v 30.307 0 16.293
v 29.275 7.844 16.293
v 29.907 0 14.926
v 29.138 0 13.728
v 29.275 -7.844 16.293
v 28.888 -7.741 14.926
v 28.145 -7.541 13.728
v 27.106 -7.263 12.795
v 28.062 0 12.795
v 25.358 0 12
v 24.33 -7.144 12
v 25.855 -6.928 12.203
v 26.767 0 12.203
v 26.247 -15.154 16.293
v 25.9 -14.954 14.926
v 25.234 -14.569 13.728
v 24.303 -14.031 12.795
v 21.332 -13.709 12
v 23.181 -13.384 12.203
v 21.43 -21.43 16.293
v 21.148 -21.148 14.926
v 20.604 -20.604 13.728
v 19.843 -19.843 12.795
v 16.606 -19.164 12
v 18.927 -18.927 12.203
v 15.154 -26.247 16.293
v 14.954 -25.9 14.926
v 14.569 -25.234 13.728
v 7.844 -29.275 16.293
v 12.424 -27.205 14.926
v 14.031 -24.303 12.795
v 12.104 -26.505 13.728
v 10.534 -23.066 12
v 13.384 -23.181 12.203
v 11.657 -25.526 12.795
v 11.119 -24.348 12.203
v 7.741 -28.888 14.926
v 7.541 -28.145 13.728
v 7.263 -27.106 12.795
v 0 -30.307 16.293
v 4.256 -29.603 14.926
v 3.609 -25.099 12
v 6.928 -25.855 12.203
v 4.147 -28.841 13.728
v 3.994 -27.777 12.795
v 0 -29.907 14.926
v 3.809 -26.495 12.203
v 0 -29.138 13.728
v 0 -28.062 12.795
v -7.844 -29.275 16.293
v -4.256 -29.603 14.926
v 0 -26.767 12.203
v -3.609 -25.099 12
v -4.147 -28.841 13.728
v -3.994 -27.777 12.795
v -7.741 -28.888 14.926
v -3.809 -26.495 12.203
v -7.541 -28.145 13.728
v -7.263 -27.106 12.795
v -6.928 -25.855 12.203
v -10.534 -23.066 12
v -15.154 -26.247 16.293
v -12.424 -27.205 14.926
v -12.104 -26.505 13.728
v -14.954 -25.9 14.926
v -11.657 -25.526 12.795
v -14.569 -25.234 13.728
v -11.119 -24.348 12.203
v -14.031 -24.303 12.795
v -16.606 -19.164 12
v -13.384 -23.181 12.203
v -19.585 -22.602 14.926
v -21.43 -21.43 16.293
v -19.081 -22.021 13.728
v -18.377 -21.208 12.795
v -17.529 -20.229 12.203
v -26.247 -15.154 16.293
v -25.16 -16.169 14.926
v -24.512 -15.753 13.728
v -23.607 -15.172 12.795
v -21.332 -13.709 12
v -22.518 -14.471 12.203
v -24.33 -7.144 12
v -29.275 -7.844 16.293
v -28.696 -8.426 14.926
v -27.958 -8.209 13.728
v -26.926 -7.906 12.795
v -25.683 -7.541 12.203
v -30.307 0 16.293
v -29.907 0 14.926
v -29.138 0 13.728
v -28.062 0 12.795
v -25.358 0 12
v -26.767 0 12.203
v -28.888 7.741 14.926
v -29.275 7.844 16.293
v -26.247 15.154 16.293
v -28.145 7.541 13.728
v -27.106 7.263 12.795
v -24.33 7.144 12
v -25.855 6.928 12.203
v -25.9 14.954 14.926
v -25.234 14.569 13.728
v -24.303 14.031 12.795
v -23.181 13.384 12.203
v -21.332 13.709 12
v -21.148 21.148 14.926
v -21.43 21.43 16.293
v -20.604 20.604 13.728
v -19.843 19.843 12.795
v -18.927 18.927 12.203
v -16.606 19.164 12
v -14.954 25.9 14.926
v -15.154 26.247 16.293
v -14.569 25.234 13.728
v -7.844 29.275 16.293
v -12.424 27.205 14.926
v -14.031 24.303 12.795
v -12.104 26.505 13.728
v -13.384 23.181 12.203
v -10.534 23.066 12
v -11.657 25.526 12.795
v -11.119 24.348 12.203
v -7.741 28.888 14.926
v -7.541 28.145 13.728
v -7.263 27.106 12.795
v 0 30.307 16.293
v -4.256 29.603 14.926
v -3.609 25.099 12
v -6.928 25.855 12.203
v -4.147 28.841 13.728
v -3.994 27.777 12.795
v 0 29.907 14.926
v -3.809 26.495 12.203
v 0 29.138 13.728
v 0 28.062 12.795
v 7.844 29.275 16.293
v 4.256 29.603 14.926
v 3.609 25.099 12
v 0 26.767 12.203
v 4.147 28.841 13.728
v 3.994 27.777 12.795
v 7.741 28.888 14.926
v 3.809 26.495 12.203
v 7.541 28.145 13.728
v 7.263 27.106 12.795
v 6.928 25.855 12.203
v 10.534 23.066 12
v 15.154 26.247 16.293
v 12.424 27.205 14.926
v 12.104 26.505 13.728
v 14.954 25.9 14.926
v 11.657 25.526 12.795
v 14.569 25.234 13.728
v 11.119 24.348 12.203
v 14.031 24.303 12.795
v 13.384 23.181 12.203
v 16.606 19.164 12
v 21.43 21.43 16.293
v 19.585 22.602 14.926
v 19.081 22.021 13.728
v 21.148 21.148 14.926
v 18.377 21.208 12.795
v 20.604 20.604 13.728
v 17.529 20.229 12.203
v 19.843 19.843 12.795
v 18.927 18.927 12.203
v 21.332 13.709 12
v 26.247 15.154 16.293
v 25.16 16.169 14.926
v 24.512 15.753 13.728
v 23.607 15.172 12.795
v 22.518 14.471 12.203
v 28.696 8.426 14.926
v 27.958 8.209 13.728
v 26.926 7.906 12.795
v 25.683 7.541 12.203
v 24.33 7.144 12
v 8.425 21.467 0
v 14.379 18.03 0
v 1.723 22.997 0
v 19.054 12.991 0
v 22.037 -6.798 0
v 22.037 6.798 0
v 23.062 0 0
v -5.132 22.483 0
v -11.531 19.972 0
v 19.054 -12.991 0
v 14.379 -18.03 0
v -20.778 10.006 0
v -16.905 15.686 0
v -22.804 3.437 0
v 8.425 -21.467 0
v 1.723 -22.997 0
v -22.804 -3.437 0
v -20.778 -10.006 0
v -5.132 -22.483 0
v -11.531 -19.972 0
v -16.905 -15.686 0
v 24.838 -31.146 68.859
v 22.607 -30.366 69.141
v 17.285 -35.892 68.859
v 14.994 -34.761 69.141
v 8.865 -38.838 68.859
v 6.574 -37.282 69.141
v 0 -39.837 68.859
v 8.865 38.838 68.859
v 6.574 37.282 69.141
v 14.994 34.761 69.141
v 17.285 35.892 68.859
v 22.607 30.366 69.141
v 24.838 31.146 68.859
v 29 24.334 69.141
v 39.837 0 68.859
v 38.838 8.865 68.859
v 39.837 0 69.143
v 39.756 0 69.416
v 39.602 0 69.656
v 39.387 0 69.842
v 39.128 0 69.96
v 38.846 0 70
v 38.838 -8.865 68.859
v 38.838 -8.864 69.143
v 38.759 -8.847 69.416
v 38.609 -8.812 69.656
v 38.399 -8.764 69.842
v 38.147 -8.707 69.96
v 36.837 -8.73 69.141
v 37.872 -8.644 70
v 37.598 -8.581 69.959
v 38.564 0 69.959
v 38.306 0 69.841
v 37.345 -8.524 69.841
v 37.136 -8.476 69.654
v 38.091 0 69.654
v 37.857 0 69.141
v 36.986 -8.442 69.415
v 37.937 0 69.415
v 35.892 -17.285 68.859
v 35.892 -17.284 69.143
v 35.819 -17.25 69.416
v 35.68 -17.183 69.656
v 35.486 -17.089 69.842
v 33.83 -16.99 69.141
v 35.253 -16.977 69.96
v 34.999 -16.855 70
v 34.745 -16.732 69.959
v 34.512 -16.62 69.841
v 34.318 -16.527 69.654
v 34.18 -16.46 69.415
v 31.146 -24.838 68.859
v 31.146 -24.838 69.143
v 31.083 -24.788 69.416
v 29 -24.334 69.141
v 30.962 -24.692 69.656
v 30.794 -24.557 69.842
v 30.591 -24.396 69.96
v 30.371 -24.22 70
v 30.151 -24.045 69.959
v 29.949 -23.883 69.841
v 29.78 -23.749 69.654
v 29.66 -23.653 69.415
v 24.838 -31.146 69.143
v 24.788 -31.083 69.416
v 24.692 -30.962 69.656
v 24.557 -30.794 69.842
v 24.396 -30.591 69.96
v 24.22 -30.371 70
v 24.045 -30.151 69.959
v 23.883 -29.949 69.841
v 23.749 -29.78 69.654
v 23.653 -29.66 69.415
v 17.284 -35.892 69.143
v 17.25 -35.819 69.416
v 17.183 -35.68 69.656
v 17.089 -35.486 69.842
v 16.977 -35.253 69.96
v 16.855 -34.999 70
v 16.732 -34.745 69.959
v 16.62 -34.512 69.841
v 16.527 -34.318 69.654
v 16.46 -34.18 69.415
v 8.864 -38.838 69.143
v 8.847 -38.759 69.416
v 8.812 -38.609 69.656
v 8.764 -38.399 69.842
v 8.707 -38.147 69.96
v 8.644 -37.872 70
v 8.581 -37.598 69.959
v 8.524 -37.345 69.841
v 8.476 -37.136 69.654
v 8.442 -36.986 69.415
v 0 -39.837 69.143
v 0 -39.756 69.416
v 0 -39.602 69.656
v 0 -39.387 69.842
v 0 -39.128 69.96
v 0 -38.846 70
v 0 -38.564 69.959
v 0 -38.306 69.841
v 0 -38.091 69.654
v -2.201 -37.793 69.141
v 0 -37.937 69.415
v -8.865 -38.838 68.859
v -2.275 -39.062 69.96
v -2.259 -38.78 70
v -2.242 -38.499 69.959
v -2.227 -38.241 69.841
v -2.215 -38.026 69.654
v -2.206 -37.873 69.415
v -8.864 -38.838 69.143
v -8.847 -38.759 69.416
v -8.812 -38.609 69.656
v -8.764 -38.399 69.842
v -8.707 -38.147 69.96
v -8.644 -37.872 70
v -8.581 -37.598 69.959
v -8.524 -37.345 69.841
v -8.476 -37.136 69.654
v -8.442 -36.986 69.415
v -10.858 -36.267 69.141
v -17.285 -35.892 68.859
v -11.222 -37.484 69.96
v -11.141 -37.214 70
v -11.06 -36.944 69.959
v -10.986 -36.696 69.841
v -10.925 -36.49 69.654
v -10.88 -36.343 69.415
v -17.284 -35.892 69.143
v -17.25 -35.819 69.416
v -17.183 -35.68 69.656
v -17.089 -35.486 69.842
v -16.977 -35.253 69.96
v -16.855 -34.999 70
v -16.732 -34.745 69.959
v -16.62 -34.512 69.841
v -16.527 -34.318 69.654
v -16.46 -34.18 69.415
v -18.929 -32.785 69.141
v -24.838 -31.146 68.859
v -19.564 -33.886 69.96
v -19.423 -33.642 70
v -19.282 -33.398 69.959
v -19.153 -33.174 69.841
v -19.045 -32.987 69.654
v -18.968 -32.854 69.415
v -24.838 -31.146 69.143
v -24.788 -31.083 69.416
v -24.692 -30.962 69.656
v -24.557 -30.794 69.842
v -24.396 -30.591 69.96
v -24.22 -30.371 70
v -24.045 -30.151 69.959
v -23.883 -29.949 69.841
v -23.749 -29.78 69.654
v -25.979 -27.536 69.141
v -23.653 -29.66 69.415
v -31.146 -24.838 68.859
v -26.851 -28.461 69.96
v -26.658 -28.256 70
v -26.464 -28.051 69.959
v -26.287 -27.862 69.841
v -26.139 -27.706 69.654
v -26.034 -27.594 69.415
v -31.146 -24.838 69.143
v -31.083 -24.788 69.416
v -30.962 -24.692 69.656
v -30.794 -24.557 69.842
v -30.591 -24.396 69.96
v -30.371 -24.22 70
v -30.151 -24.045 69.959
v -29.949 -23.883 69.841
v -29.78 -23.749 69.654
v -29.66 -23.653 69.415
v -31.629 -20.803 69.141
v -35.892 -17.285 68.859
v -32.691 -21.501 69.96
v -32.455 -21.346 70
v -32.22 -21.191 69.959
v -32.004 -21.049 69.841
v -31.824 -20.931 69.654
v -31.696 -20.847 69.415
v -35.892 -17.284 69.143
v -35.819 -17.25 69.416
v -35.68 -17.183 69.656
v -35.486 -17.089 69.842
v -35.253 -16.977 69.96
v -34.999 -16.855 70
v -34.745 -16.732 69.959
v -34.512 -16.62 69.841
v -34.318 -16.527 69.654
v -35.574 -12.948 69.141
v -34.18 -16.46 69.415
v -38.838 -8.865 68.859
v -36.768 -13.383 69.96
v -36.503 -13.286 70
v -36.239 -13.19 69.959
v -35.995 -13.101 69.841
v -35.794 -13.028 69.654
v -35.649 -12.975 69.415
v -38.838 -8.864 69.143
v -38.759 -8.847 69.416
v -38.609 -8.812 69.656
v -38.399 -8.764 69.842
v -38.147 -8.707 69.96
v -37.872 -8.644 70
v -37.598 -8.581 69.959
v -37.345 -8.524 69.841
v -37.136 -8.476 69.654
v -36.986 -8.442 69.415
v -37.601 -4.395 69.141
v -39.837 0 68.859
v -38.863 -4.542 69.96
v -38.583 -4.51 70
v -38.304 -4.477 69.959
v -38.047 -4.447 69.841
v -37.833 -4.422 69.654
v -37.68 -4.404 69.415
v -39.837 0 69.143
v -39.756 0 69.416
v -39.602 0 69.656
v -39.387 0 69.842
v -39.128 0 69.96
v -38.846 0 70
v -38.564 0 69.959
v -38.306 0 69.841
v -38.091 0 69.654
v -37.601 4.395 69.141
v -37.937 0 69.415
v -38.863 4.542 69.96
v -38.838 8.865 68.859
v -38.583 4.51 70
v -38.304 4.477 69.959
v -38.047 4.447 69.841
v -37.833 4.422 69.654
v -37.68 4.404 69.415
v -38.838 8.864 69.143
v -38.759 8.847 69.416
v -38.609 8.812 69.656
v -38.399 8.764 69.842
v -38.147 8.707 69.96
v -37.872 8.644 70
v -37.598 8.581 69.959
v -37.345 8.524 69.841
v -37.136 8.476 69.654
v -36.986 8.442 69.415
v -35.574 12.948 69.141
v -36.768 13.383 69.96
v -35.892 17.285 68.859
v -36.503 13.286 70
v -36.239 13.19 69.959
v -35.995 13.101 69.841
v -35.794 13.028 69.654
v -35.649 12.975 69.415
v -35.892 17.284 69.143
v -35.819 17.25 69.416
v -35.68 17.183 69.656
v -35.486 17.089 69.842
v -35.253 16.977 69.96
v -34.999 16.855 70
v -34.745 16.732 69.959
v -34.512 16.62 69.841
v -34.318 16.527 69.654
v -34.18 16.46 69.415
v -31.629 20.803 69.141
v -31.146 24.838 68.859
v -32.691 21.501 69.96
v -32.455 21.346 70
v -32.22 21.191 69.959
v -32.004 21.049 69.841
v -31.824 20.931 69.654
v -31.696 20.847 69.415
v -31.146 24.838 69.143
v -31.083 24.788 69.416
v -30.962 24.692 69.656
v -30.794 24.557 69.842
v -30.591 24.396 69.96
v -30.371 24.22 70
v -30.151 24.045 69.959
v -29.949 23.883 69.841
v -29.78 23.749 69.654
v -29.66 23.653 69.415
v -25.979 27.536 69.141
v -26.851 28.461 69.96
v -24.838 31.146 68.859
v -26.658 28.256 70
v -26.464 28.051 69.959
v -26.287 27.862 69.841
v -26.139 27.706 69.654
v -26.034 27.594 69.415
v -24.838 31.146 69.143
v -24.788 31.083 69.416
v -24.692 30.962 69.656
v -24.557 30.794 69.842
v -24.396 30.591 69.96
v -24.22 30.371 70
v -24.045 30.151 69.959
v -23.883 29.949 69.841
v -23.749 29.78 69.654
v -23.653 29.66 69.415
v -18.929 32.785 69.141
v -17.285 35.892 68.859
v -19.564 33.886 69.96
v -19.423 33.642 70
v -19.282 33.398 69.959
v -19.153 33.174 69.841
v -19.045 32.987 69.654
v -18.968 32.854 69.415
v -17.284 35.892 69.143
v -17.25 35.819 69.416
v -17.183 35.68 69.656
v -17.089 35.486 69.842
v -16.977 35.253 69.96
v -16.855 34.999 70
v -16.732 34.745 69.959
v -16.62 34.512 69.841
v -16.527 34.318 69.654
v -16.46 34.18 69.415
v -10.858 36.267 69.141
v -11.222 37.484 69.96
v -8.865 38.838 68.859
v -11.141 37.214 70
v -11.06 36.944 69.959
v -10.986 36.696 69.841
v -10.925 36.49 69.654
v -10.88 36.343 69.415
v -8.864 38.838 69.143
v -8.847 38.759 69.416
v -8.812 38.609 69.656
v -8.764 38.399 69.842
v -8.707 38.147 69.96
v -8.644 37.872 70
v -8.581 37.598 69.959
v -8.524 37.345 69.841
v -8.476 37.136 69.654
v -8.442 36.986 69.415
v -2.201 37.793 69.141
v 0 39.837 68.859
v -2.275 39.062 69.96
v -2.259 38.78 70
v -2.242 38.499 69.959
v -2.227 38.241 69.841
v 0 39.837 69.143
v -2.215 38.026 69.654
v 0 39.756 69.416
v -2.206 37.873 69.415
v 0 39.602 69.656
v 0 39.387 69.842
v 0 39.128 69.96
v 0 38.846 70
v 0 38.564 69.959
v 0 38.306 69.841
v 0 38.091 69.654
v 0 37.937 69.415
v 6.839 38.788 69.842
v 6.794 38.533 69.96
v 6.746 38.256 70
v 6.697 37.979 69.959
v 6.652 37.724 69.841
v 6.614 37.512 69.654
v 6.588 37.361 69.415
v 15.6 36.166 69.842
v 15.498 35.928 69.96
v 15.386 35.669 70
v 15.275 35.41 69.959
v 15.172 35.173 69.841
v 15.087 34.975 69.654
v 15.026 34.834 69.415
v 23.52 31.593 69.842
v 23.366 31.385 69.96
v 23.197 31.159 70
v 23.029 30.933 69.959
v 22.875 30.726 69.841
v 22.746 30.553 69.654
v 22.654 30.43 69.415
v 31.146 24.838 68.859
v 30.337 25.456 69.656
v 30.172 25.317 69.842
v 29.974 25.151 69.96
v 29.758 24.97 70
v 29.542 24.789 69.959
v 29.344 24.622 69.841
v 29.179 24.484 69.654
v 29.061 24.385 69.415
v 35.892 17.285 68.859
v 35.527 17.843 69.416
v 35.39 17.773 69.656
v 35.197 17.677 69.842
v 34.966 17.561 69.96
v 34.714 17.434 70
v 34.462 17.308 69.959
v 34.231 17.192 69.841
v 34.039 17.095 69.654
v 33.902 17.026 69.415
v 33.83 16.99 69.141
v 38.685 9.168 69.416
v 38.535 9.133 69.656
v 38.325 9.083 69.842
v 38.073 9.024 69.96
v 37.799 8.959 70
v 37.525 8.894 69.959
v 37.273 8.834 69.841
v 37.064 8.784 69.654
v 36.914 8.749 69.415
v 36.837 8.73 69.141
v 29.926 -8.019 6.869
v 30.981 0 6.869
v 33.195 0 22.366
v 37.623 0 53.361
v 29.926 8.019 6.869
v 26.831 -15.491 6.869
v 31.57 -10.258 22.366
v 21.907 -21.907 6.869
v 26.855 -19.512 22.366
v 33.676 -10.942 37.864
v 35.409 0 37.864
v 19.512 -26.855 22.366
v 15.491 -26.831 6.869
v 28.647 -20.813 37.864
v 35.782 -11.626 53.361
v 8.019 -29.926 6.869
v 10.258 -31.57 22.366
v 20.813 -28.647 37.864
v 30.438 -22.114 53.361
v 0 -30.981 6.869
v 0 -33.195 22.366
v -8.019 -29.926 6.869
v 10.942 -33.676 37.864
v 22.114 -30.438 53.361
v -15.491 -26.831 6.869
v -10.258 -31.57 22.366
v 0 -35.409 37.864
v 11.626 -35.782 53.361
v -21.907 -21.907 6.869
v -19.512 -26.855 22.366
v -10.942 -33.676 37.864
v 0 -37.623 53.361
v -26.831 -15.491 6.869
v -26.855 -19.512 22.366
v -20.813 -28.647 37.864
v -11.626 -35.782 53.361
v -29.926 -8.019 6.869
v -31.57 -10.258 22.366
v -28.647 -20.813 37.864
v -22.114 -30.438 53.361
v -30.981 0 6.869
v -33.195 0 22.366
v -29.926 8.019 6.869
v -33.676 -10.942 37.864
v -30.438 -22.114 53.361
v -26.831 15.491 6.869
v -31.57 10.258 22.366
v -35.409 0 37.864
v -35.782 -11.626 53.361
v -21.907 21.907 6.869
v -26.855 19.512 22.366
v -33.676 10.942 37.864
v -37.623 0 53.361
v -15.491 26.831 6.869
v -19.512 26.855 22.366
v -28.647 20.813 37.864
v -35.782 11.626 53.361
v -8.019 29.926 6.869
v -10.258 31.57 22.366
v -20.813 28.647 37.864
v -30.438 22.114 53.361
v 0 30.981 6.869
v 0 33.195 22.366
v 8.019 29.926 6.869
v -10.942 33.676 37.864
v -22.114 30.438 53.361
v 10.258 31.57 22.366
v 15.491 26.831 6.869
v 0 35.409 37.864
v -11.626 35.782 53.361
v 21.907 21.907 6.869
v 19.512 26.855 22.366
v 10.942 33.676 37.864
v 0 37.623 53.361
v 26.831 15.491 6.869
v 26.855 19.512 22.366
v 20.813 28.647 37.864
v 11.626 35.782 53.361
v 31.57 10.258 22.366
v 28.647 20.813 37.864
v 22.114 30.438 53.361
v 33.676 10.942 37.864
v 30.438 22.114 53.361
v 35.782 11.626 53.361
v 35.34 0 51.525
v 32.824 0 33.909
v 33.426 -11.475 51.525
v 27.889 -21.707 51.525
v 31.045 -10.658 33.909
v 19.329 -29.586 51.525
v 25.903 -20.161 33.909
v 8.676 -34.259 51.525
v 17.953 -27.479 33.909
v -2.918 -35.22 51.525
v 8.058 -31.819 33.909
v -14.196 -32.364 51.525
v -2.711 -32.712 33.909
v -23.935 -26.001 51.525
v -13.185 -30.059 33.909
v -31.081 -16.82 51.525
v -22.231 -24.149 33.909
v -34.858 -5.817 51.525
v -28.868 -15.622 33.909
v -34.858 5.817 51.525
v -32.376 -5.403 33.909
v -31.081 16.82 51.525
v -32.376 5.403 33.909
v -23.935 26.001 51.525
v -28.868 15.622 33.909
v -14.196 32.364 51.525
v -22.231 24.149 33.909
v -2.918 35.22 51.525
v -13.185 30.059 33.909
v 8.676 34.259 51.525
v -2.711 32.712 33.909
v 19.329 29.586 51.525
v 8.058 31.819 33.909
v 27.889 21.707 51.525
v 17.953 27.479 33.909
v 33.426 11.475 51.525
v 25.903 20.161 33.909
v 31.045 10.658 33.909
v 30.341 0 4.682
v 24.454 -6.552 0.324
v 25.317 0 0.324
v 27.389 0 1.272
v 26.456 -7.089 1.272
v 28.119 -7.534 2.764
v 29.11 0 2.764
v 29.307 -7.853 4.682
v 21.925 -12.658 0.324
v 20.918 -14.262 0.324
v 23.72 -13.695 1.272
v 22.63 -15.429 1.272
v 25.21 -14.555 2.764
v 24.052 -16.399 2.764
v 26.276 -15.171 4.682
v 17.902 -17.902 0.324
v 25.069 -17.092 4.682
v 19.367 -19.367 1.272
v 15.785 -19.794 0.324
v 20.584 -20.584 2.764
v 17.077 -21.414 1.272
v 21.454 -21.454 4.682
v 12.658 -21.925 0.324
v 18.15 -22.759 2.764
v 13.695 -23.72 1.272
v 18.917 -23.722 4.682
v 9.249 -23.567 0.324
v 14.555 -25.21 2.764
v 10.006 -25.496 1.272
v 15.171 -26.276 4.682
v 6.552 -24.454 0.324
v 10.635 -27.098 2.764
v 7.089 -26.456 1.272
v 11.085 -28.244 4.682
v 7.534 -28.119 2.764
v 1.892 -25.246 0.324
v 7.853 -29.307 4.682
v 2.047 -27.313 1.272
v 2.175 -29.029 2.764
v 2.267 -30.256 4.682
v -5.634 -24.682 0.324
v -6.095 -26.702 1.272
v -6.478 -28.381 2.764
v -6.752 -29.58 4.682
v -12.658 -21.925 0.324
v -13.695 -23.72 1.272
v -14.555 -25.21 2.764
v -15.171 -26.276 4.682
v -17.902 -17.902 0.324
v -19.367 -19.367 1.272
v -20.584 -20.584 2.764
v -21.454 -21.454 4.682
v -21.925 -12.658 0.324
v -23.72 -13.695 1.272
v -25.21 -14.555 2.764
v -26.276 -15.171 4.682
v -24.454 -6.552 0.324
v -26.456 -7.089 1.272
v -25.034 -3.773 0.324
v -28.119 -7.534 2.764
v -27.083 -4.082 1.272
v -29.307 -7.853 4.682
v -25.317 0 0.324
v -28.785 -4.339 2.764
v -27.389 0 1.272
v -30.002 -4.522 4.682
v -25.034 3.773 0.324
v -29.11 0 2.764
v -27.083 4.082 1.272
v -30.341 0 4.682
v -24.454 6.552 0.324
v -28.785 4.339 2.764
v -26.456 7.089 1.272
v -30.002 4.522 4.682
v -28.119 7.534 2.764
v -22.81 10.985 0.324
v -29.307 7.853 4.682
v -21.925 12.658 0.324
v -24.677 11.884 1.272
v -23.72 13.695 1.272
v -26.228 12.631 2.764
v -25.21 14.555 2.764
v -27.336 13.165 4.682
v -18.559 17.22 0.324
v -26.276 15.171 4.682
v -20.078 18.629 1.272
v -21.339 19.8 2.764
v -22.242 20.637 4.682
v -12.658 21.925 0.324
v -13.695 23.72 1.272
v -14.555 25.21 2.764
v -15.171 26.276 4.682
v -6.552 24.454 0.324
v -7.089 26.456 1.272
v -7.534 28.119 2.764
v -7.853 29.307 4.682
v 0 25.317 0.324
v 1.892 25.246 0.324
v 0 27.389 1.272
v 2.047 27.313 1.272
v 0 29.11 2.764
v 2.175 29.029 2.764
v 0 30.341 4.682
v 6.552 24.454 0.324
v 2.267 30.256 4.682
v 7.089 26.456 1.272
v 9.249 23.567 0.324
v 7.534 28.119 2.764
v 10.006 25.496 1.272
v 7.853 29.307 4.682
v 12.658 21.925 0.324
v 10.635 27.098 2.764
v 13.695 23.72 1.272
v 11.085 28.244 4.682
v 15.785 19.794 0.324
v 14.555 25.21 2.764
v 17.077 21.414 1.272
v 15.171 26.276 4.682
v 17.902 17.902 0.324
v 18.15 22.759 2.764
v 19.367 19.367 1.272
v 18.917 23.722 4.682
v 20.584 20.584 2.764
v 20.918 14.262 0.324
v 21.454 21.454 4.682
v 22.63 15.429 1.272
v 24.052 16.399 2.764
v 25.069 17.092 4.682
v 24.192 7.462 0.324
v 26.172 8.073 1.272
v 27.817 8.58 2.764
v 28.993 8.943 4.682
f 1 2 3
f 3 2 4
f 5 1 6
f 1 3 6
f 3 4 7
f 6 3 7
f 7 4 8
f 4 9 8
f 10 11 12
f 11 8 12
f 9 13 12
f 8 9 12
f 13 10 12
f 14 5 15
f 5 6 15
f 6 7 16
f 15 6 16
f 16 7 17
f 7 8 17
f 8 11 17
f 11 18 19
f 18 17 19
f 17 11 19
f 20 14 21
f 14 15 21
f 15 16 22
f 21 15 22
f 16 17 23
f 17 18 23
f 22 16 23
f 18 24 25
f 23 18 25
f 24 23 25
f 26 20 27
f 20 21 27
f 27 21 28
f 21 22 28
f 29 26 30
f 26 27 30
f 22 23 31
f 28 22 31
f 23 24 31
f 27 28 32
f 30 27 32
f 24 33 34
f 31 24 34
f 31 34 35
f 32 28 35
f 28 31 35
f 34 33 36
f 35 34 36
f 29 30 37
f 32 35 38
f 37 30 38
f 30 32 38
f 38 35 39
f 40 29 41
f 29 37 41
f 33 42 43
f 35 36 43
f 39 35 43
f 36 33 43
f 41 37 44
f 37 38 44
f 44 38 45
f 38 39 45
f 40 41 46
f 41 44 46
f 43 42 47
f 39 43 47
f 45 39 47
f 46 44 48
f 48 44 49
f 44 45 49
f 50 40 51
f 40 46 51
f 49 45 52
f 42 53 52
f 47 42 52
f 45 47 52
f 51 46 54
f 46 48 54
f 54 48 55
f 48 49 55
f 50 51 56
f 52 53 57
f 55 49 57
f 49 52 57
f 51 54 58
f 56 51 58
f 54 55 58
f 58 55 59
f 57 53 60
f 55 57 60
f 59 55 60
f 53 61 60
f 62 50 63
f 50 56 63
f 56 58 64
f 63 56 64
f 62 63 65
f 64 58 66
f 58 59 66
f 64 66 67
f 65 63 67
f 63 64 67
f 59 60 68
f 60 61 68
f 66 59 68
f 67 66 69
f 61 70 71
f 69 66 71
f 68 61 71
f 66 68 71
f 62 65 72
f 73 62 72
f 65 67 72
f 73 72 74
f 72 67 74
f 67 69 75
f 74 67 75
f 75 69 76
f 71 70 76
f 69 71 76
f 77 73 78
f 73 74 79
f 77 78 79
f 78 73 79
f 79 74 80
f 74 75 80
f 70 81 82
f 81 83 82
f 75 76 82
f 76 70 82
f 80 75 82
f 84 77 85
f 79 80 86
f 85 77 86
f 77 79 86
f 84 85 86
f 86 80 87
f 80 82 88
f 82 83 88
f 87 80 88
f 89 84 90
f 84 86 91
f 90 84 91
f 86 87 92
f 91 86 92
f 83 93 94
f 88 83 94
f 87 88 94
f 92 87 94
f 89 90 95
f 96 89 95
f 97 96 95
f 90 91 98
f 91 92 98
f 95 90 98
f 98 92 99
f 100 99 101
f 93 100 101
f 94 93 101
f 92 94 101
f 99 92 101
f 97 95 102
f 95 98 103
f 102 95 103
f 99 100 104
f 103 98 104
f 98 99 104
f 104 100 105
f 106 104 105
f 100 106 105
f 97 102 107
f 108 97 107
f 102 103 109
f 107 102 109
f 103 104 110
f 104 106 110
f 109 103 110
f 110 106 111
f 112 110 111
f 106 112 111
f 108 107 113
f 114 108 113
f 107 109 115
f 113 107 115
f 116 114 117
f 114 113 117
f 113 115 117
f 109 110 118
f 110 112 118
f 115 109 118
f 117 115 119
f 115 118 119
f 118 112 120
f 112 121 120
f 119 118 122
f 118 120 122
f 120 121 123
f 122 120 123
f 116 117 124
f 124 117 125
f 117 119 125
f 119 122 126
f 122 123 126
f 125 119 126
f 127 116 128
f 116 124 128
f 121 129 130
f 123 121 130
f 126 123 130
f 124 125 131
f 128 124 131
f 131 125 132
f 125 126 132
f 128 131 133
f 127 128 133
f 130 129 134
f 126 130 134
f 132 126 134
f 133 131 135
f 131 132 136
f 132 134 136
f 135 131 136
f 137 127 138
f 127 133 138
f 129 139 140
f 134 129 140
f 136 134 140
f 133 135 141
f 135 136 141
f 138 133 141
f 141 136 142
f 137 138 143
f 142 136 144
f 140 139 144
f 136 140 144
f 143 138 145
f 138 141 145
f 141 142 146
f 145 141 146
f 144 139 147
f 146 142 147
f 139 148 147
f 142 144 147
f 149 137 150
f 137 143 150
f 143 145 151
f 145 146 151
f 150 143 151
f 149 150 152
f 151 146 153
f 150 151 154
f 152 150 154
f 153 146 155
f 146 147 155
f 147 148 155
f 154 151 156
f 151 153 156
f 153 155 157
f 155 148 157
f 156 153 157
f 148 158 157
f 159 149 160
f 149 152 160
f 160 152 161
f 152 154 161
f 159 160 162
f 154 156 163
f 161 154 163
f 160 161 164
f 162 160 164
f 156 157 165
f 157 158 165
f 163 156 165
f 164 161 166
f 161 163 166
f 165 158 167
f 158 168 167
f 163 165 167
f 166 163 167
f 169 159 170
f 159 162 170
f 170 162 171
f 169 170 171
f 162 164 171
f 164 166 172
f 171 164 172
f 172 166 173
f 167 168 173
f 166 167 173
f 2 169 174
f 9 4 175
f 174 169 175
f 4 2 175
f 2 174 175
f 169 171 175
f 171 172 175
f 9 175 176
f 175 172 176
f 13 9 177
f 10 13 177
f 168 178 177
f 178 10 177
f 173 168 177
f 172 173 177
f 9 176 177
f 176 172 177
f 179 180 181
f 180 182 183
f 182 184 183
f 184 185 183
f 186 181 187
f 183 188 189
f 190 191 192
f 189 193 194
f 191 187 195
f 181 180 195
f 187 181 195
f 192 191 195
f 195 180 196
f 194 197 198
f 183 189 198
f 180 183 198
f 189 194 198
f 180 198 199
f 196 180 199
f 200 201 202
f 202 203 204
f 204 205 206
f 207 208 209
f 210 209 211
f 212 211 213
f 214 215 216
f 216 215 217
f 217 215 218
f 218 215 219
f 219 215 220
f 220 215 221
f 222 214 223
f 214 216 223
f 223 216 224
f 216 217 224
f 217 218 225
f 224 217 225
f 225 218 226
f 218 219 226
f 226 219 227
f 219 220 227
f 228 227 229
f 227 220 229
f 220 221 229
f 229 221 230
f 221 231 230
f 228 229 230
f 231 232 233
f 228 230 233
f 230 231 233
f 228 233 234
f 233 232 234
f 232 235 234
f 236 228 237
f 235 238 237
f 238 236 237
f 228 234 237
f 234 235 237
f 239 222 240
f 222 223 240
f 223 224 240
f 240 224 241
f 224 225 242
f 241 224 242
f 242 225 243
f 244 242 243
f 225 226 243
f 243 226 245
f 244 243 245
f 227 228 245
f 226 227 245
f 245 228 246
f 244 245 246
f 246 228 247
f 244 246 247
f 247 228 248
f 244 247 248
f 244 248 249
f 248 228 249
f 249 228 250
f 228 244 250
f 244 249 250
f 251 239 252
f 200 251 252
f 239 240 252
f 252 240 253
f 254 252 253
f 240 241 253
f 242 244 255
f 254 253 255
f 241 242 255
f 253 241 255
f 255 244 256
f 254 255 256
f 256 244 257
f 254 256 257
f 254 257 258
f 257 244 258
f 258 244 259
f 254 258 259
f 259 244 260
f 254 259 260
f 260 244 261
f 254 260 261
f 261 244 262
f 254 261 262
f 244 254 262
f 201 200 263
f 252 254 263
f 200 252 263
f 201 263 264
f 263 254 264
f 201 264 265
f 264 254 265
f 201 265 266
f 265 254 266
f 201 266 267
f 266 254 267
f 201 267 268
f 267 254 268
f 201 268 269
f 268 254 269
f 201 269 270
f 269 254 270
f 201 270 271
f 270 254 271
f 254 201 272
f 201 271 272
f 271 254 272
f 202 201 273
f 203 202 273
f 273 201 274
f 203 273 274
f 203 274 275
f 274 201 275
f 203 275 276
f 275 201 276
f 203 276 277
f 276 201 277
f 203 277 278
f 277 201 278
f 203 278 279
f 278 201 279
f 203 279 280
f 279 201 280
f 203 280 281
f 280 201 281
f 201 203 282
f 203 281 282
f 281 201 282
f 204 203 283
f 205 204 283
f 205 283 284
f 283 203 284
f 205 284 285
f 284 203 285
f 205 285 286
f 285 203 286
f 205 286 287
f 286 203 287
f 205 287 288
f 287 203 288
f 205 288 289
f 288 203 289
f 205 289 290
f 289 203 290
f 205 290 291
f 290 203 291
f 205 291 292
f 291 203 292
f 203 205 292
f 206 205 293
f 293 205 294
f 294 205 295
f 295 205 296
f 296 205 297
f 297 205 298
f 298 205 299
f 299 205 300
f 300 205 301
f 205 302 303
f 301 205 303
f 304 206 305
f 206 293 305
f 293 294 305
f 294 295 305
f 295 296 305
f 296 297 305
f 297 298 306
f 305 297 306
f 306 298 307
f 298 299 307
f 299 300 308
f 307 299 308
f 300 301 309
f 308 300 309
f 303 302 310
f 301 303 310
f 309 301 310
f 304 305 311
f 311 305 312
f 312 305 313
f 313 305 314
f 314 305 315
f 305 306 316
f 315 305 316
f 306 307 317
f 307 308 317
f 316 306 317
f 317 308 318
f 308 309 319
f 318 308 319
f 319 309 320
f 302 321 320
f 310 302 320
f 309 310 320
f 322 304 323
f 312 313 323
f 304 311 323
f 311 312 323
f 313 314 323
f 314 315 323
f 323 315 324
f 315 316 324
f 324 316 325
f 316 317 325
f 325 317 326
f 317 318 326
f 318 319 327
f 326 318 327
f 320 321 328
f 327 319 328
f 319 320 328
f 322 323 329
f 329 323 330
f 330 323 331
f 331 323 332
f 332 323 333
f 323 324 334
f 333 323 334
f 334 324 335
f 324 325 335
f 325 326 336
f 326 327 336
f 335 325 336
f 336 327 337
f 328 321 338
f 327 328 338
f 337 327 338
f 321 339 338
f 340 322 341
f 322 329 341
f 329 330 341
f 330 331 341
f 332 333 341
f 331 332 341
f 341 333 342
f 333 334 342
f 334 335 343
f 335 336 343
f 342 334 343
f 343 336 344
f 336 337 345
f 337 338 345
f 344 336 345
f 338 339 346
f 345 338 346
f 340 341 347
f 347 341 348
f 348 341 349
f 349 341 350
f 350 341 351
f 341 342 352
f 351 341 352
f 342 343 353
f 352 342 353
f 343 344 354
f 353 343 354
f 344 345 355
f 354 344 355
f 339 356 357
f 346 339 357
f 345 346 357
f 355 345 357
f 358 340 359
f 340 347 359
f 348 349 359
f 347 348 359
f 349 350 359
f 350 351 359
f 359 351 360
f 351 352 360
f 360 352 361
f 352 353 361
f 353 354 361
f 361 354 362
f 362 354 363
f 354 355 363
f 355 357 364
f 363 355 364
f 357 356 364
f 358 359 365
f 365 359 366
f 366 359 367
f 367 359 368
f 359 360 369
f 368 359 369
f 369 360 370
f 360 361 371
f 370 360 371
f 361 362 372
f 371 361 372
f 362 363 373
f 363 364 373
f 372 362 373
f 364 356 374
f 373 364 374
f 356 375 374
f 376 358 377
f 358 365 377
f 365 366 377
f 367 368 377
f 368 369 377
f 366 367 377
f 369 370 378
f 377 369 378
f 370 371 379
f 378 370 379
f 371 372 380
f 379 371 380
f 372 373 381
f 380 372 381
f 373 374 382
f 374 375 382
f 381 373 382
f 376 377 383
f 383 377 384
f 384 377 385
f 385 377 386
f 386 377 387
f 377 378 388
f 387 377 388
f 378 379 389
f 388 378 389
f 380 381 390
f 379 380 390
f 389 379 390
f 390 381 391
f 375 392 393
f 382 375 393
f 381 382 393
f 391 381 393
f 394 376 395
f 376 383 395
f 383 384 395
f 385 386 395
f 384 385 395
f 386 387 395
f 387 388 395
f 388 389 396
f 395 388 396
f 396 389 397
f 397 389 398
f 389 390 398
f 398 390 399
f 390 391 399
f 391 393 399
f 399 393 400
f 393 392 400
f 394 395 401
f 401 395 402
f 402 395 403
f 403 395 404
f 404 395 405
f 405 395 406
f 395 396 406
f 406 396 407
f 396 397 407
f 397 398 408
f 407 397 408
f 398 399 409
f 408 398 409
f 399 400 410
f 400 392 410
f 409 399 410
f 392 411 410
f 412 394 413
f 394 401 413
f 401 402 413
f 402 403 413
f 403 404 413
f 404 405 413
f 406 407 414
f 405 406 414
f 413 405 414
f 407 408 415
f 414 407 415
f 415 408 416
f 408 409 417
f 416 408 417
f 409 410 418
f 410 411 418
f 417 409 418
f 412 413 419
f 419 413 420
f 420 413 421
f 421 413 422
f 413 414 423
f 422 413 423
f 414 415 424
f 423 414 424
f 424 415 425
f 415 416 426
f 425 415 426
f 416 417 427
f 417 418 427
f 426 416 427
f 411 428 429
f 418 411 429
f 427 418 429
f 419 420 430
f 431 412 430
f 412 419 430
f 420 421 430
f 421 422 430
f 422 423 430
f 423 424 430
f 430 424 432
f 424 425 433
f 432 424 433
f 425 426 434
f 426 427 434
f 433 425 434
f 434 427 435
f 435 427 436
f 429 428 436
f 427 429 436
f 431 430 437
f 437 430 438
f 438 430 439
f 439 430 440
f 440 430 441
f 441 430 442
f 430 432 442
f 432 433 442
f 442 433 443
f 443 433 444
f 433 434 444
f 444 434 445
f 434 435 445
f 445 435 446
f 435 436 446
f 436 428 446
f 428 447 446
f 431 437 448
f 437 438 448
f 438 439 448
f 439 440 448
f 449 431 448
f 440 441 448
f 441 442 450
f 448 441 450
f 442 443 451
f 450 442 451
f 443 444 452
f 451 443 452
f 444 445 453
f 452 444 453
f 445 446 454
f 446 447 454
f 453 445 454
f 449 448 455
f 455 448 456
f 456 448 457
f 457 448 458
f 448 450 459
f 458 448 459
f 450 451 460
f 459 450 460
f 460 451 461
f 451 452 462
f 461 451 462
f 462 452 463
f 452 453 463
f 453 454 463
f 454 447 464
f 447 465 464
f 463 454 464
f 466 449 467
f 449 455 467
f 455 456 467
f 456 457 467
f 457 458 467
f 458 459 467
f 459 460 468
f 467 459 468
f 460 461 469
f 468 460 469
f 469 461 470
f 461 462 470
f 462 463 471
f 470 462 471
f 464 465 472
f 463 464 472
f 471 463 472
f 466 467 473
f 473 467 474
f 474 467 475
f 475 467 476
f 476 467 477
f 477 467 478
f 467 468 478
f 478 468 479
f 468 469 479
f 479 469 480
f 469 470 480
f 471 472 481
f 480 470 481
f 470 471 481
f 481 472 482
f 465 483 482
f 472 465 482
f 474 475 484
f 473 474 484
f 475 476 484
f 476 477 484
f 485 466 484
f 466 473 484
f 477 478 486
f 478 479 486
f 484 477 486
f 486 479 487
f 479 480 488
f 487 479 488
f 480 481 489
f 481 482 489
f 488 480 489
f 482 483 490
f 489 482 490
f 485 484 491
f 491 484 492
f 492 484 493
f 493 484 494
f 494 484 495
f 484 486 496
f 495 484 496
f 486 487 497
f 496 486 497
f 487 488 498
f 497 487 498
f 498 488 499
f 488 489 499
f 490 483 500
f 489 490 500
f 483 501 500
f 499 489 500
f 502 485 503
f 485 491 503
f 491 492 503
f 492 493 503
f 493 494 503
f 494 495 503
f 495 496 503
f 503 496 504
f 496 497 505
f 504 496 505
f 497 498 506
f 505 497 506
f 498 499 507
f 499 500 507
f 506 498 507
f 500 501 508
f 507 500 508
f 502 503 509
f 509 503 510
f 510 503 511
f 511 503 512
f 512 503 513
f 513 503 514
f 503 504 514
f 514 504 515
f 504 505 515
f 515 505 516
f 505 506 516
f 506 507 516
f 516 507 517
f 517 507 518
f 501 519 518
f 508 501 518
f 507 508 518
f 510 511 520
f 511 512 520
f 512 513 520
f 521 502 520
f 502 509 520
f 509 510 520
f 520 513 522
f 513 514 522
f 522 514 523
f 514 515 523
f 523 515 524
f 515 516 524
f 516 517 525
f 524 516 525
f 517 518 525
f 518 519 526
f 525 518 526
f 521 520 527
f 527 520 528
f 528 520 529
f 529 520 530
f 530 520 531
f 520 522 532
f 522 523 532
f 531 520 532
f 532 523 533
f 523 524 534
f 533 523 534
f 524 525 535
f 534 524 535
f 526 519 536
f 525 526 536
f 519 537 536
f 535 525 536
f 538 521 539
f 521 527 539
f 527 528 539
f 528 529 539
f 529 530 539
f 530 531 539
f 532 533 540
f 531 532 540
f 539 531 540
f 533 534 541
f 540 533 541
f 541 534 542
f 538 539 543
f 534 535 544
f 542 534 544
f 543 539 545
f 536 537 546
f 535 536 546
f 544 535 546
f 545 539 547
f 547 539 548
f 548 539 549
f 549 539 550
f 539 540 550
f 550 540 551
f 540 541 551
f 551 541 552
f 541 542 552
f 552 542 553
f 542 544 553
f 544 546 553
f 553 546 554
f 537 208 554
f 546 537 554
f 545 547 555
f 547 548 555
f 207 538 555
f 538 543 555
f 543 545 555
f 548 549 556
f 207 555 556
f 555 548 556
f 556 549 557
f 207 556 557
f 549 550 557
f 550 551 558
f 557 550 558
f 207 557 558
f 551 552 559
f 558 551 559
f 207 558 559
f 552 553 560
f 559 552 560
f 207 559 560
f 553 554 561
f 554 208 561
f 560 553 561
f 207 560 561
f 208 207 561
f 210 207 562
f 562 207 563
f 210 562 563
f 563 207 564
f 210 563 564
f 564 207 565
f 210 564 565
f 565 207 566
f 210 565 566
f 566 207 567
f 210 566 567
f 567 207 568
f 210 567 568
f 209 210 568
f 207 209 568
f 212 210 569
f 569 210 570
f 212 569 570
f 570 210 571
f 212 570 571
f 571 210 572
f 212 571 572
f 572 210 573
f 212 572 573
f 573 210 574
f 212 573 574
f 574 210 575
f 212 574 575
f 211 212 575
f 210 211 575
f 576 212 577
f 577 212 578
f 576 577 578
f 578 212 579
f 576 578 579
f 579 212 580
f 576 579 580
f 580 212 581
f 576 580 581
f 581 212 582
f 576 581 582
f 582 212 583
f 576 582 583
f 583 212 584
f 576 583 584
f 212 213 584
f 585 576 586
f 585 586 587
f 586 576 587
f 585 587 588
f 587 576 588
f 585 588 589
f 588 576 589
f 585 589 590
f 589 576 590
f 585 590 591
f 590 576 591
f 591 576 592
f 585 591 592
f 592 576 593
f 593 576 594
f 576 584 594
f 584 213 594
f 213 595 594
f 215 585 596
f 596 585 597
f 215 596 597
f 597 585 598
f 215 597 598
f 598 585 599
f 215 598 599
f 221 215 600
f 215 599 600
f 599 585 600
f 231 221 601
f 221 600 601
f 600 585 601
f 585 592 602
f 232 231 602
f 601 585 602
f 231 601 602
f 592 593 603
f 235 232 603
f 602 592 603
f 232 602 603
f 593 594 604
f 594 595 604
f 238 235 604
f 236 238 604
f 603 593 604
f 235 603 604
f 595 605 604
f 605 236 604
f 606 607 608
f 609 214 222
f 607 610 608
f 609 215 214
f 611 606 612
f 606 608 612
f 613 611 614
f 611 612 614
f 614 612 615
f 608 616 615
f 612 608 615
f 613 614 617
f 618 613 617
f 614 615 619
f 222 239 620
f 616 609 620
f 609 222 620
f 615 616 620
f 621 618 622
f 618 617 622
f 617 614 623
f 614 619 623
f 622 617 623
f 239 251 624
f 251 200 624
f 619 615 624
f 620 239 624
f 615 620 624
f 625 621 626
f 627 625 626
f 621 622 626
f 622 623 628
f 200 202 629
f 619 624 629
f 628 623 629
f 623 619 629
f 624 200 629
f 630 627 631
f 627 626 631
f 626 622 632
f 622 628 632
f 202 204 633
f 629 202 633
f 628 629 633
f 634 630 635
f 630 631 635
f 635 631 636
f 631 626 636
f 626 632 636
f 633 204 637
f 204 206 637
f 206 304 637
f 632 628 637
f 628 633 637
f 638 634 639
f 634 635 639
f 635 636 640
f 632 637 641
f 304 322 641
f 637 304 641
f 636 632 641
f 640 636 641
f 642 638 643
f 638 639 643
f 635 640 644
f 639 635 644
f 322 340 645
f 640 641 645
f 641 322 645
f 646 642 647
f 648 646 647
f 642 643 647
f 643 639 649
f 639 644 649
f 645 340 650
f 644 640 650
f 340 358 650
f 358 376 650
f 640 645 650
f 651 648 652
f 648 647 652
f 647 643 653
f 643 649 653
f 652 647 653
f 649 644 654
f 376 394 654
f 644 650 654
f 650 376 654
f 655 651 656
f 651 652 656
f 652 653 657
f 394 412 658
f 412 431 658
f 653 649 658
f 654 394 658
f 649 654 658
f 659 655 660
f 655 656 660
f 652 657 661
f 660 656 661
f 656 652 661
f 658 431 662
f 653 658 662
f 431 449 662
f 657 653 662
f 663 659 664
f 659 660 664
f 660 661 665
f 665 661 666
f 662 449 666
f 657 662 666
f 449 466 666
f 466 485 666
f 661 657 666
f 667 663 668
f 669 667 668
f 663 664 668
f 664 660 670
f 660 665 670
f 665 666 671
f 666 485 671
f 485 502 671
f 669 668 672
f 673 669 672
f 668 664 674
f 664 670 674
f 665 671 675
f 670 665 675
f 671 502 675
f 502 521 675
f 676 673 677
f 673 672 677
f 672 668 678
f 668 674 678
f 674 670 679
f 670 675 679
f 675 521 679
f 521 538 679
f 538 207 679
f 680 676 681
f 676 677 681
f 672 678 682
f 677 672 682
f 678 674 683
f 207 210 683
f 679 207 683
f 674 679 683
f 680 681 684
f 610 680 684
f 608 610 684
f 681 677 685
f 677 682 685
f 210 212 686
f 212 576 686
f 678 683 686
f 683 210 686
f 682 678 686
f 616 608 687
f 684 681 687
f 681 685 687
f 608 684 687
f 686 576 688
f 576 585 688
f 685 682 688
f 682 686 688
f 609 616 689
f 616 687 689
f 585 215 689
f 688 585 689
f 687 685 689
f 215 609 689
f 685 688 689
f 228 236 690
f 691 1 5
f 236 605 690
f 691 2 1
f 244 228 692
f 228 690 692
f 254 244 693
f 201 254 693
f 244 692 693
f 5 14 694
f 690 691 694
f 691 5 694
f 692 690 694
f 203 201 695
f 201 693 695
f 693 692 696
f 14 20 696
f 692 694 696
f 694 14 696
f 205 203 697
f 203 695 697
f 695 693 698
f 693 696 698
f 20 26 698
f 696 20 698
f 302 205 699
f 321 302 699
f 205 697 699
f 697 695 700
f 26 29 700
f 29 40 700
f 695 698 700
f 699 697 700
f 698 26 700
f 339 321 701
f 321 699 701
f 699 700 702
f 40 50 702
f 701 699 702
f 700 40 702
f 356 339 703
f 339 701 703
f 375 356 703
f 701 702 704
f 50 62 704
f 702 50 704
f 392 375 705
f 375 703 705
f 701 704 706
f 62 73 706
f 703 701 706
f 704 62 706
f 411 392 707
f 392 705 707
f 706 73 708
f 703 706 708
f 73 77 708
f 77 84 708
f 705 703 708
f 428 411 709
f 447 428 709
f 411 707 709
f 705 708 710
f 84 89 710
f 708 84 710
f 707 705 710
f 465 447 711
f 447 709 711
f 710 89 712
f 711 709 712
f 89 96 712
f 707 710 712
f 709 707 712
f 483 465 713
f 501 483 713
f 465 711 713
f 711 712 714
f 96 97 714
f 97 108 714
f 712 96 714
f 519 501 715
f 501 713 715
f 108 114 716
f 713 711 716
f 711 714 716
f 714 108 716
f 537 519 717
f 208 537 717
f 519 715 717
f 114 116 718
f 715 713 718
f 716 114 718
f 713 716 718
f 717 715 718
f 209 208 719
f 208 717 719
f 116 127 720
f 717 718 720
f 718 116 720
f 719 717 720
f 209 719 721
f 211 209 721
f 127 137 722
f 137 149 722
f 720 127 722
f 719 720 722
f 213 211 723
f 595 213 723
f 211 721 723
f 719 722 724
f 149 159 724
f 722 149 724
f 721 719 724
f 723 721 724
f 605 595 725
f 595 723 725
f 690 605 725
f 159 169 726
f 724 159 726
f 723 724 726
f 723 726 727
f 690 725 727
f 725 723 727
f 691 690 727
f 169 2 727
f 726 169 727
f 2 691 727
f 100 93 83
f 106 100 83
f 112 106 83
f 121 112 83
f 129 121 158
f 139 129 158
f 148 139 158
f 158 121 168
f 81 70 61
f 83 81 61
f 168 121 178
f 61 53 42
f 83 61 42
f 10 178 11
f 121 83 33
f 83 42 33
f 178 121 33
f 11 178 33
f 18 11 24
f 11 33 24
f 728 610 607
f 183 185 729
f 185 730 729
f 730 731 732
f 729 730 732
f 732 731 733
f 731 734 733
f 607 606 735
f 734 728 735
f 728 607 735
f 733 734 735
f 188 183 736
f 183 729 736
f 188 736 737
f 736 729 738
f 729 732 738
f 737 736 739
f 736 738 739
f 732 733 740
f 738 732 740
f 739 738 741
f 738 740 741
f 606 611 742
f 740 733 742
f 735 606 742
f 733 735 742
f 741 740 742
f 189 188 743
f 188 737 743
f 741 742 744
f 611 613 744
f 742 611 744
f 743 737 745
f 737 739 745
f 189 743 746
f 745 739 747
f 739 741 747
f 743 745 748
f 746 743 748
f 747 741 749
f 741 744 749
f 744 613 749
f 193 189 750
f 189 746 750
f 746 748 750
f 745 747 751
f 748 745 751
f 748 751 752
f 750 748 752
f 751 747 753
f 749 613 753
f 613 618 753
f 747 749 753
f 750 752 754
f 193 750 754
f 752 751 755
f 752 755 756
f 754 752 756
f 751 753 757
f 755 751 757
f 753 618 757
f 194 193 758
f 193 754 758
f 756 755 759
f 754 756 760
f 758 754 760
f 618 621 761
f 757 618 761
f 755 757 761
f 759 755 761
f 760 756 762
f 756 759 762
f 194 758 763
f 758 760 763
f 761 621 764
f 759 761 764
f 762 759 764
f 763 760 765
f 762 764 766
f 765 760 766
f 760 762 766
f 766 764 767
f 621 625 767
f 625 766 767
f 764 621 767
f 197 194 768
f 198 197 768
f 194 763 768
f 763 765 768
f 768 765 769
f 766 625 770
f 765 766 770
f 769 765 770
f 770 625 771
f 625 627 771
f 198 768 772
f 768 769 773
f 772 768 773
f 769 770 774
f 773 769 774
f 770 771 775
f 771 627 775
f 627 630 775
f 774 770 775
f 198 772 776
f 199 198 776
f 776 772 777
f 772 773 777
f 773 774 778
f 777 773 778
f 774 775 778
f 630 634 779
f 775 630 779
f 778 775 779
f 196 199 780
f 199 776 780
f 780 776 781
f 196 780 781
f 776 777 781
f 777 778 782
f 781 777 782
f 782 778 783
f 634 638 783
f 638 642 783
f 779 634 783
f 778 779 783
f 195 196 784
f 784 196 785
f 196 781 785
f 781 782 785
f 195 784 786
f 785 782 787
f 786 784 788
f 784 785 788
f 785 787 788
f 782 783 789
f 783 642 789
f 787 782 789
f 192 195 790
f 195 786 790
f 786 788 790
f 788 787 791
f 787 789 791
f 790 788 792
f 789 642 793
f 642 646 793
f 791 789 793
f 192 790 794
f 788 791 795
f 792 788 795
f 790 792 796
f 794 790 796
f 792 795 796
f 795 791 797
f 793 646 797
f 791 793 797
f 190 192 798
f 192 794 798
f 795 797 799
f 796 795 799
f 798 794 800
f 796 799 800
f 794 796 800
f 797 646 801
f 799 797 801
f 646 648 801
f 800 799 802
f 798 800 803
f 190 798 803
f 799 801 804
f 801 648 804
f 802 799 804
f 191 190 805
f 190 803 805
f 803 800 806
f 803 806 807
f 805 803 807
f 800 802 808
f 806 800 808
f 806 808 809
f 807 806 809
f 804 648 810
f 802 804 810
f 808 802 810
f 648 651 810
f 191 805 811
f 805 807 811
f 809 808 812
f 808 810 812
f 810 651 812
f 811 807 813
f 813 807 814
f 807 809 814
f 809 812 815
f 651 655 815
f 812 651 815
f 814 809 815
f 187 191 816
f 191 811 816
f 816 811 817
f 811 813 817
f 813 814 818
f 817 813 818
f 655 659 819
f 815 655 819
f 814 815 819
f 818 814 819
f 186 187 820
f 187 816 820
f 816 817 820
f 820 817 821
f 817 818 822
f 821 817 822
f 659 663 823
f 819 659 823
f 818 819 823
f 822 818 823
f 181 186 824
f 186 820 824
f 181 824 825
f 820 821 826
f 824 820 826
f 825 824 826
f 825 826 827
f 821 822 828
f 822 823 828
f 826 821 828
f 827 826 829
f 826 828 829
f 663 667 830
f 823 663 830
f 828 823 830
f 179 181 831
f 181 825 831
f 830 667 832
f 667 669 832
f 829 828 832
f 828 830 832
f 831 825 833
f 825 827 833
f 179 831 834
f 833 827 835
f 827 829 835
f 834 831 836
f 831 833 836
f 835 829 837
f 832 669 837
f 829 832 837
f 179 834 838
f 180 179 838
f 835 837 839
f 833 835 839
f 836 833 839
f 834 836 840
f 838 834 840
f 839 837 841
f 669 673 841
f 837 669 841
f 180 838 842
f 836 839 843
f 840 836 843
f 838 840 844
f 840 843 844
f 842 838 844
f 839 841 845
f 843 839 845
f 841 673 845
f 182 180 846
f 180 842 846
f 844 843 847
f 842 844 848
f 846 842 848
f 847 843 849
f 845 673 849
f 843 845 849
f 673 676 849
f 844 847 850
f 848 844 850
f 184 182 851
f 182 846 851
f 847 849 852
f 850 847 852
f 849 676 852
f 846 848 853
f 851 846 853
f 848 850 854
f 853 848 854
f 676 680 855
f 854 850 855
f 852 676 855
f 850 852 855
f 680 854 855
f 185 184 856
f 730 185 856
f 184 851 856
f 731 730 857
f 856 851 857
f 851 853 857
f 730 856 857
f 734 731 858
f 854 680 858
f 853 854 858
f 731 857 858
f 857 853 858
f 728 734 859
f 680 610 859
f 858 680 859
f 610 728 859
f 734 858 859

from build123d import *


with BuildPart() as f1:
    # F0 (on Front) → F1 (revolve)
    with BuildSketch(Plane.XZ):
        with BuildLine():
            Line((25.357504, 12), (0, 12))
            Line((0, 12), (0, 0))
            Line((0, 0), (23.061637, 0))
            ThreePointArc((23.061637, 0), (28.303251, 1.956368), (30.981233, 6.868629))
            Line((30.981233, 6.868629), (39.83694, 68.858579))
            ThreePointArc((39.83694, 68.858579), (38.988412, 69.989949), (37.857041, 69.141421))
            Line((37.857041, 69.141421), (30.307251, 16.292893))
            ThreePointArc((30.307251, 16.292893), (28.633512, 13.22273), (25.357504, 12))
        make_face()
    revolve(axis=Axis((0, 0, 6), (0, 0, -1)))


solid = f1.part
